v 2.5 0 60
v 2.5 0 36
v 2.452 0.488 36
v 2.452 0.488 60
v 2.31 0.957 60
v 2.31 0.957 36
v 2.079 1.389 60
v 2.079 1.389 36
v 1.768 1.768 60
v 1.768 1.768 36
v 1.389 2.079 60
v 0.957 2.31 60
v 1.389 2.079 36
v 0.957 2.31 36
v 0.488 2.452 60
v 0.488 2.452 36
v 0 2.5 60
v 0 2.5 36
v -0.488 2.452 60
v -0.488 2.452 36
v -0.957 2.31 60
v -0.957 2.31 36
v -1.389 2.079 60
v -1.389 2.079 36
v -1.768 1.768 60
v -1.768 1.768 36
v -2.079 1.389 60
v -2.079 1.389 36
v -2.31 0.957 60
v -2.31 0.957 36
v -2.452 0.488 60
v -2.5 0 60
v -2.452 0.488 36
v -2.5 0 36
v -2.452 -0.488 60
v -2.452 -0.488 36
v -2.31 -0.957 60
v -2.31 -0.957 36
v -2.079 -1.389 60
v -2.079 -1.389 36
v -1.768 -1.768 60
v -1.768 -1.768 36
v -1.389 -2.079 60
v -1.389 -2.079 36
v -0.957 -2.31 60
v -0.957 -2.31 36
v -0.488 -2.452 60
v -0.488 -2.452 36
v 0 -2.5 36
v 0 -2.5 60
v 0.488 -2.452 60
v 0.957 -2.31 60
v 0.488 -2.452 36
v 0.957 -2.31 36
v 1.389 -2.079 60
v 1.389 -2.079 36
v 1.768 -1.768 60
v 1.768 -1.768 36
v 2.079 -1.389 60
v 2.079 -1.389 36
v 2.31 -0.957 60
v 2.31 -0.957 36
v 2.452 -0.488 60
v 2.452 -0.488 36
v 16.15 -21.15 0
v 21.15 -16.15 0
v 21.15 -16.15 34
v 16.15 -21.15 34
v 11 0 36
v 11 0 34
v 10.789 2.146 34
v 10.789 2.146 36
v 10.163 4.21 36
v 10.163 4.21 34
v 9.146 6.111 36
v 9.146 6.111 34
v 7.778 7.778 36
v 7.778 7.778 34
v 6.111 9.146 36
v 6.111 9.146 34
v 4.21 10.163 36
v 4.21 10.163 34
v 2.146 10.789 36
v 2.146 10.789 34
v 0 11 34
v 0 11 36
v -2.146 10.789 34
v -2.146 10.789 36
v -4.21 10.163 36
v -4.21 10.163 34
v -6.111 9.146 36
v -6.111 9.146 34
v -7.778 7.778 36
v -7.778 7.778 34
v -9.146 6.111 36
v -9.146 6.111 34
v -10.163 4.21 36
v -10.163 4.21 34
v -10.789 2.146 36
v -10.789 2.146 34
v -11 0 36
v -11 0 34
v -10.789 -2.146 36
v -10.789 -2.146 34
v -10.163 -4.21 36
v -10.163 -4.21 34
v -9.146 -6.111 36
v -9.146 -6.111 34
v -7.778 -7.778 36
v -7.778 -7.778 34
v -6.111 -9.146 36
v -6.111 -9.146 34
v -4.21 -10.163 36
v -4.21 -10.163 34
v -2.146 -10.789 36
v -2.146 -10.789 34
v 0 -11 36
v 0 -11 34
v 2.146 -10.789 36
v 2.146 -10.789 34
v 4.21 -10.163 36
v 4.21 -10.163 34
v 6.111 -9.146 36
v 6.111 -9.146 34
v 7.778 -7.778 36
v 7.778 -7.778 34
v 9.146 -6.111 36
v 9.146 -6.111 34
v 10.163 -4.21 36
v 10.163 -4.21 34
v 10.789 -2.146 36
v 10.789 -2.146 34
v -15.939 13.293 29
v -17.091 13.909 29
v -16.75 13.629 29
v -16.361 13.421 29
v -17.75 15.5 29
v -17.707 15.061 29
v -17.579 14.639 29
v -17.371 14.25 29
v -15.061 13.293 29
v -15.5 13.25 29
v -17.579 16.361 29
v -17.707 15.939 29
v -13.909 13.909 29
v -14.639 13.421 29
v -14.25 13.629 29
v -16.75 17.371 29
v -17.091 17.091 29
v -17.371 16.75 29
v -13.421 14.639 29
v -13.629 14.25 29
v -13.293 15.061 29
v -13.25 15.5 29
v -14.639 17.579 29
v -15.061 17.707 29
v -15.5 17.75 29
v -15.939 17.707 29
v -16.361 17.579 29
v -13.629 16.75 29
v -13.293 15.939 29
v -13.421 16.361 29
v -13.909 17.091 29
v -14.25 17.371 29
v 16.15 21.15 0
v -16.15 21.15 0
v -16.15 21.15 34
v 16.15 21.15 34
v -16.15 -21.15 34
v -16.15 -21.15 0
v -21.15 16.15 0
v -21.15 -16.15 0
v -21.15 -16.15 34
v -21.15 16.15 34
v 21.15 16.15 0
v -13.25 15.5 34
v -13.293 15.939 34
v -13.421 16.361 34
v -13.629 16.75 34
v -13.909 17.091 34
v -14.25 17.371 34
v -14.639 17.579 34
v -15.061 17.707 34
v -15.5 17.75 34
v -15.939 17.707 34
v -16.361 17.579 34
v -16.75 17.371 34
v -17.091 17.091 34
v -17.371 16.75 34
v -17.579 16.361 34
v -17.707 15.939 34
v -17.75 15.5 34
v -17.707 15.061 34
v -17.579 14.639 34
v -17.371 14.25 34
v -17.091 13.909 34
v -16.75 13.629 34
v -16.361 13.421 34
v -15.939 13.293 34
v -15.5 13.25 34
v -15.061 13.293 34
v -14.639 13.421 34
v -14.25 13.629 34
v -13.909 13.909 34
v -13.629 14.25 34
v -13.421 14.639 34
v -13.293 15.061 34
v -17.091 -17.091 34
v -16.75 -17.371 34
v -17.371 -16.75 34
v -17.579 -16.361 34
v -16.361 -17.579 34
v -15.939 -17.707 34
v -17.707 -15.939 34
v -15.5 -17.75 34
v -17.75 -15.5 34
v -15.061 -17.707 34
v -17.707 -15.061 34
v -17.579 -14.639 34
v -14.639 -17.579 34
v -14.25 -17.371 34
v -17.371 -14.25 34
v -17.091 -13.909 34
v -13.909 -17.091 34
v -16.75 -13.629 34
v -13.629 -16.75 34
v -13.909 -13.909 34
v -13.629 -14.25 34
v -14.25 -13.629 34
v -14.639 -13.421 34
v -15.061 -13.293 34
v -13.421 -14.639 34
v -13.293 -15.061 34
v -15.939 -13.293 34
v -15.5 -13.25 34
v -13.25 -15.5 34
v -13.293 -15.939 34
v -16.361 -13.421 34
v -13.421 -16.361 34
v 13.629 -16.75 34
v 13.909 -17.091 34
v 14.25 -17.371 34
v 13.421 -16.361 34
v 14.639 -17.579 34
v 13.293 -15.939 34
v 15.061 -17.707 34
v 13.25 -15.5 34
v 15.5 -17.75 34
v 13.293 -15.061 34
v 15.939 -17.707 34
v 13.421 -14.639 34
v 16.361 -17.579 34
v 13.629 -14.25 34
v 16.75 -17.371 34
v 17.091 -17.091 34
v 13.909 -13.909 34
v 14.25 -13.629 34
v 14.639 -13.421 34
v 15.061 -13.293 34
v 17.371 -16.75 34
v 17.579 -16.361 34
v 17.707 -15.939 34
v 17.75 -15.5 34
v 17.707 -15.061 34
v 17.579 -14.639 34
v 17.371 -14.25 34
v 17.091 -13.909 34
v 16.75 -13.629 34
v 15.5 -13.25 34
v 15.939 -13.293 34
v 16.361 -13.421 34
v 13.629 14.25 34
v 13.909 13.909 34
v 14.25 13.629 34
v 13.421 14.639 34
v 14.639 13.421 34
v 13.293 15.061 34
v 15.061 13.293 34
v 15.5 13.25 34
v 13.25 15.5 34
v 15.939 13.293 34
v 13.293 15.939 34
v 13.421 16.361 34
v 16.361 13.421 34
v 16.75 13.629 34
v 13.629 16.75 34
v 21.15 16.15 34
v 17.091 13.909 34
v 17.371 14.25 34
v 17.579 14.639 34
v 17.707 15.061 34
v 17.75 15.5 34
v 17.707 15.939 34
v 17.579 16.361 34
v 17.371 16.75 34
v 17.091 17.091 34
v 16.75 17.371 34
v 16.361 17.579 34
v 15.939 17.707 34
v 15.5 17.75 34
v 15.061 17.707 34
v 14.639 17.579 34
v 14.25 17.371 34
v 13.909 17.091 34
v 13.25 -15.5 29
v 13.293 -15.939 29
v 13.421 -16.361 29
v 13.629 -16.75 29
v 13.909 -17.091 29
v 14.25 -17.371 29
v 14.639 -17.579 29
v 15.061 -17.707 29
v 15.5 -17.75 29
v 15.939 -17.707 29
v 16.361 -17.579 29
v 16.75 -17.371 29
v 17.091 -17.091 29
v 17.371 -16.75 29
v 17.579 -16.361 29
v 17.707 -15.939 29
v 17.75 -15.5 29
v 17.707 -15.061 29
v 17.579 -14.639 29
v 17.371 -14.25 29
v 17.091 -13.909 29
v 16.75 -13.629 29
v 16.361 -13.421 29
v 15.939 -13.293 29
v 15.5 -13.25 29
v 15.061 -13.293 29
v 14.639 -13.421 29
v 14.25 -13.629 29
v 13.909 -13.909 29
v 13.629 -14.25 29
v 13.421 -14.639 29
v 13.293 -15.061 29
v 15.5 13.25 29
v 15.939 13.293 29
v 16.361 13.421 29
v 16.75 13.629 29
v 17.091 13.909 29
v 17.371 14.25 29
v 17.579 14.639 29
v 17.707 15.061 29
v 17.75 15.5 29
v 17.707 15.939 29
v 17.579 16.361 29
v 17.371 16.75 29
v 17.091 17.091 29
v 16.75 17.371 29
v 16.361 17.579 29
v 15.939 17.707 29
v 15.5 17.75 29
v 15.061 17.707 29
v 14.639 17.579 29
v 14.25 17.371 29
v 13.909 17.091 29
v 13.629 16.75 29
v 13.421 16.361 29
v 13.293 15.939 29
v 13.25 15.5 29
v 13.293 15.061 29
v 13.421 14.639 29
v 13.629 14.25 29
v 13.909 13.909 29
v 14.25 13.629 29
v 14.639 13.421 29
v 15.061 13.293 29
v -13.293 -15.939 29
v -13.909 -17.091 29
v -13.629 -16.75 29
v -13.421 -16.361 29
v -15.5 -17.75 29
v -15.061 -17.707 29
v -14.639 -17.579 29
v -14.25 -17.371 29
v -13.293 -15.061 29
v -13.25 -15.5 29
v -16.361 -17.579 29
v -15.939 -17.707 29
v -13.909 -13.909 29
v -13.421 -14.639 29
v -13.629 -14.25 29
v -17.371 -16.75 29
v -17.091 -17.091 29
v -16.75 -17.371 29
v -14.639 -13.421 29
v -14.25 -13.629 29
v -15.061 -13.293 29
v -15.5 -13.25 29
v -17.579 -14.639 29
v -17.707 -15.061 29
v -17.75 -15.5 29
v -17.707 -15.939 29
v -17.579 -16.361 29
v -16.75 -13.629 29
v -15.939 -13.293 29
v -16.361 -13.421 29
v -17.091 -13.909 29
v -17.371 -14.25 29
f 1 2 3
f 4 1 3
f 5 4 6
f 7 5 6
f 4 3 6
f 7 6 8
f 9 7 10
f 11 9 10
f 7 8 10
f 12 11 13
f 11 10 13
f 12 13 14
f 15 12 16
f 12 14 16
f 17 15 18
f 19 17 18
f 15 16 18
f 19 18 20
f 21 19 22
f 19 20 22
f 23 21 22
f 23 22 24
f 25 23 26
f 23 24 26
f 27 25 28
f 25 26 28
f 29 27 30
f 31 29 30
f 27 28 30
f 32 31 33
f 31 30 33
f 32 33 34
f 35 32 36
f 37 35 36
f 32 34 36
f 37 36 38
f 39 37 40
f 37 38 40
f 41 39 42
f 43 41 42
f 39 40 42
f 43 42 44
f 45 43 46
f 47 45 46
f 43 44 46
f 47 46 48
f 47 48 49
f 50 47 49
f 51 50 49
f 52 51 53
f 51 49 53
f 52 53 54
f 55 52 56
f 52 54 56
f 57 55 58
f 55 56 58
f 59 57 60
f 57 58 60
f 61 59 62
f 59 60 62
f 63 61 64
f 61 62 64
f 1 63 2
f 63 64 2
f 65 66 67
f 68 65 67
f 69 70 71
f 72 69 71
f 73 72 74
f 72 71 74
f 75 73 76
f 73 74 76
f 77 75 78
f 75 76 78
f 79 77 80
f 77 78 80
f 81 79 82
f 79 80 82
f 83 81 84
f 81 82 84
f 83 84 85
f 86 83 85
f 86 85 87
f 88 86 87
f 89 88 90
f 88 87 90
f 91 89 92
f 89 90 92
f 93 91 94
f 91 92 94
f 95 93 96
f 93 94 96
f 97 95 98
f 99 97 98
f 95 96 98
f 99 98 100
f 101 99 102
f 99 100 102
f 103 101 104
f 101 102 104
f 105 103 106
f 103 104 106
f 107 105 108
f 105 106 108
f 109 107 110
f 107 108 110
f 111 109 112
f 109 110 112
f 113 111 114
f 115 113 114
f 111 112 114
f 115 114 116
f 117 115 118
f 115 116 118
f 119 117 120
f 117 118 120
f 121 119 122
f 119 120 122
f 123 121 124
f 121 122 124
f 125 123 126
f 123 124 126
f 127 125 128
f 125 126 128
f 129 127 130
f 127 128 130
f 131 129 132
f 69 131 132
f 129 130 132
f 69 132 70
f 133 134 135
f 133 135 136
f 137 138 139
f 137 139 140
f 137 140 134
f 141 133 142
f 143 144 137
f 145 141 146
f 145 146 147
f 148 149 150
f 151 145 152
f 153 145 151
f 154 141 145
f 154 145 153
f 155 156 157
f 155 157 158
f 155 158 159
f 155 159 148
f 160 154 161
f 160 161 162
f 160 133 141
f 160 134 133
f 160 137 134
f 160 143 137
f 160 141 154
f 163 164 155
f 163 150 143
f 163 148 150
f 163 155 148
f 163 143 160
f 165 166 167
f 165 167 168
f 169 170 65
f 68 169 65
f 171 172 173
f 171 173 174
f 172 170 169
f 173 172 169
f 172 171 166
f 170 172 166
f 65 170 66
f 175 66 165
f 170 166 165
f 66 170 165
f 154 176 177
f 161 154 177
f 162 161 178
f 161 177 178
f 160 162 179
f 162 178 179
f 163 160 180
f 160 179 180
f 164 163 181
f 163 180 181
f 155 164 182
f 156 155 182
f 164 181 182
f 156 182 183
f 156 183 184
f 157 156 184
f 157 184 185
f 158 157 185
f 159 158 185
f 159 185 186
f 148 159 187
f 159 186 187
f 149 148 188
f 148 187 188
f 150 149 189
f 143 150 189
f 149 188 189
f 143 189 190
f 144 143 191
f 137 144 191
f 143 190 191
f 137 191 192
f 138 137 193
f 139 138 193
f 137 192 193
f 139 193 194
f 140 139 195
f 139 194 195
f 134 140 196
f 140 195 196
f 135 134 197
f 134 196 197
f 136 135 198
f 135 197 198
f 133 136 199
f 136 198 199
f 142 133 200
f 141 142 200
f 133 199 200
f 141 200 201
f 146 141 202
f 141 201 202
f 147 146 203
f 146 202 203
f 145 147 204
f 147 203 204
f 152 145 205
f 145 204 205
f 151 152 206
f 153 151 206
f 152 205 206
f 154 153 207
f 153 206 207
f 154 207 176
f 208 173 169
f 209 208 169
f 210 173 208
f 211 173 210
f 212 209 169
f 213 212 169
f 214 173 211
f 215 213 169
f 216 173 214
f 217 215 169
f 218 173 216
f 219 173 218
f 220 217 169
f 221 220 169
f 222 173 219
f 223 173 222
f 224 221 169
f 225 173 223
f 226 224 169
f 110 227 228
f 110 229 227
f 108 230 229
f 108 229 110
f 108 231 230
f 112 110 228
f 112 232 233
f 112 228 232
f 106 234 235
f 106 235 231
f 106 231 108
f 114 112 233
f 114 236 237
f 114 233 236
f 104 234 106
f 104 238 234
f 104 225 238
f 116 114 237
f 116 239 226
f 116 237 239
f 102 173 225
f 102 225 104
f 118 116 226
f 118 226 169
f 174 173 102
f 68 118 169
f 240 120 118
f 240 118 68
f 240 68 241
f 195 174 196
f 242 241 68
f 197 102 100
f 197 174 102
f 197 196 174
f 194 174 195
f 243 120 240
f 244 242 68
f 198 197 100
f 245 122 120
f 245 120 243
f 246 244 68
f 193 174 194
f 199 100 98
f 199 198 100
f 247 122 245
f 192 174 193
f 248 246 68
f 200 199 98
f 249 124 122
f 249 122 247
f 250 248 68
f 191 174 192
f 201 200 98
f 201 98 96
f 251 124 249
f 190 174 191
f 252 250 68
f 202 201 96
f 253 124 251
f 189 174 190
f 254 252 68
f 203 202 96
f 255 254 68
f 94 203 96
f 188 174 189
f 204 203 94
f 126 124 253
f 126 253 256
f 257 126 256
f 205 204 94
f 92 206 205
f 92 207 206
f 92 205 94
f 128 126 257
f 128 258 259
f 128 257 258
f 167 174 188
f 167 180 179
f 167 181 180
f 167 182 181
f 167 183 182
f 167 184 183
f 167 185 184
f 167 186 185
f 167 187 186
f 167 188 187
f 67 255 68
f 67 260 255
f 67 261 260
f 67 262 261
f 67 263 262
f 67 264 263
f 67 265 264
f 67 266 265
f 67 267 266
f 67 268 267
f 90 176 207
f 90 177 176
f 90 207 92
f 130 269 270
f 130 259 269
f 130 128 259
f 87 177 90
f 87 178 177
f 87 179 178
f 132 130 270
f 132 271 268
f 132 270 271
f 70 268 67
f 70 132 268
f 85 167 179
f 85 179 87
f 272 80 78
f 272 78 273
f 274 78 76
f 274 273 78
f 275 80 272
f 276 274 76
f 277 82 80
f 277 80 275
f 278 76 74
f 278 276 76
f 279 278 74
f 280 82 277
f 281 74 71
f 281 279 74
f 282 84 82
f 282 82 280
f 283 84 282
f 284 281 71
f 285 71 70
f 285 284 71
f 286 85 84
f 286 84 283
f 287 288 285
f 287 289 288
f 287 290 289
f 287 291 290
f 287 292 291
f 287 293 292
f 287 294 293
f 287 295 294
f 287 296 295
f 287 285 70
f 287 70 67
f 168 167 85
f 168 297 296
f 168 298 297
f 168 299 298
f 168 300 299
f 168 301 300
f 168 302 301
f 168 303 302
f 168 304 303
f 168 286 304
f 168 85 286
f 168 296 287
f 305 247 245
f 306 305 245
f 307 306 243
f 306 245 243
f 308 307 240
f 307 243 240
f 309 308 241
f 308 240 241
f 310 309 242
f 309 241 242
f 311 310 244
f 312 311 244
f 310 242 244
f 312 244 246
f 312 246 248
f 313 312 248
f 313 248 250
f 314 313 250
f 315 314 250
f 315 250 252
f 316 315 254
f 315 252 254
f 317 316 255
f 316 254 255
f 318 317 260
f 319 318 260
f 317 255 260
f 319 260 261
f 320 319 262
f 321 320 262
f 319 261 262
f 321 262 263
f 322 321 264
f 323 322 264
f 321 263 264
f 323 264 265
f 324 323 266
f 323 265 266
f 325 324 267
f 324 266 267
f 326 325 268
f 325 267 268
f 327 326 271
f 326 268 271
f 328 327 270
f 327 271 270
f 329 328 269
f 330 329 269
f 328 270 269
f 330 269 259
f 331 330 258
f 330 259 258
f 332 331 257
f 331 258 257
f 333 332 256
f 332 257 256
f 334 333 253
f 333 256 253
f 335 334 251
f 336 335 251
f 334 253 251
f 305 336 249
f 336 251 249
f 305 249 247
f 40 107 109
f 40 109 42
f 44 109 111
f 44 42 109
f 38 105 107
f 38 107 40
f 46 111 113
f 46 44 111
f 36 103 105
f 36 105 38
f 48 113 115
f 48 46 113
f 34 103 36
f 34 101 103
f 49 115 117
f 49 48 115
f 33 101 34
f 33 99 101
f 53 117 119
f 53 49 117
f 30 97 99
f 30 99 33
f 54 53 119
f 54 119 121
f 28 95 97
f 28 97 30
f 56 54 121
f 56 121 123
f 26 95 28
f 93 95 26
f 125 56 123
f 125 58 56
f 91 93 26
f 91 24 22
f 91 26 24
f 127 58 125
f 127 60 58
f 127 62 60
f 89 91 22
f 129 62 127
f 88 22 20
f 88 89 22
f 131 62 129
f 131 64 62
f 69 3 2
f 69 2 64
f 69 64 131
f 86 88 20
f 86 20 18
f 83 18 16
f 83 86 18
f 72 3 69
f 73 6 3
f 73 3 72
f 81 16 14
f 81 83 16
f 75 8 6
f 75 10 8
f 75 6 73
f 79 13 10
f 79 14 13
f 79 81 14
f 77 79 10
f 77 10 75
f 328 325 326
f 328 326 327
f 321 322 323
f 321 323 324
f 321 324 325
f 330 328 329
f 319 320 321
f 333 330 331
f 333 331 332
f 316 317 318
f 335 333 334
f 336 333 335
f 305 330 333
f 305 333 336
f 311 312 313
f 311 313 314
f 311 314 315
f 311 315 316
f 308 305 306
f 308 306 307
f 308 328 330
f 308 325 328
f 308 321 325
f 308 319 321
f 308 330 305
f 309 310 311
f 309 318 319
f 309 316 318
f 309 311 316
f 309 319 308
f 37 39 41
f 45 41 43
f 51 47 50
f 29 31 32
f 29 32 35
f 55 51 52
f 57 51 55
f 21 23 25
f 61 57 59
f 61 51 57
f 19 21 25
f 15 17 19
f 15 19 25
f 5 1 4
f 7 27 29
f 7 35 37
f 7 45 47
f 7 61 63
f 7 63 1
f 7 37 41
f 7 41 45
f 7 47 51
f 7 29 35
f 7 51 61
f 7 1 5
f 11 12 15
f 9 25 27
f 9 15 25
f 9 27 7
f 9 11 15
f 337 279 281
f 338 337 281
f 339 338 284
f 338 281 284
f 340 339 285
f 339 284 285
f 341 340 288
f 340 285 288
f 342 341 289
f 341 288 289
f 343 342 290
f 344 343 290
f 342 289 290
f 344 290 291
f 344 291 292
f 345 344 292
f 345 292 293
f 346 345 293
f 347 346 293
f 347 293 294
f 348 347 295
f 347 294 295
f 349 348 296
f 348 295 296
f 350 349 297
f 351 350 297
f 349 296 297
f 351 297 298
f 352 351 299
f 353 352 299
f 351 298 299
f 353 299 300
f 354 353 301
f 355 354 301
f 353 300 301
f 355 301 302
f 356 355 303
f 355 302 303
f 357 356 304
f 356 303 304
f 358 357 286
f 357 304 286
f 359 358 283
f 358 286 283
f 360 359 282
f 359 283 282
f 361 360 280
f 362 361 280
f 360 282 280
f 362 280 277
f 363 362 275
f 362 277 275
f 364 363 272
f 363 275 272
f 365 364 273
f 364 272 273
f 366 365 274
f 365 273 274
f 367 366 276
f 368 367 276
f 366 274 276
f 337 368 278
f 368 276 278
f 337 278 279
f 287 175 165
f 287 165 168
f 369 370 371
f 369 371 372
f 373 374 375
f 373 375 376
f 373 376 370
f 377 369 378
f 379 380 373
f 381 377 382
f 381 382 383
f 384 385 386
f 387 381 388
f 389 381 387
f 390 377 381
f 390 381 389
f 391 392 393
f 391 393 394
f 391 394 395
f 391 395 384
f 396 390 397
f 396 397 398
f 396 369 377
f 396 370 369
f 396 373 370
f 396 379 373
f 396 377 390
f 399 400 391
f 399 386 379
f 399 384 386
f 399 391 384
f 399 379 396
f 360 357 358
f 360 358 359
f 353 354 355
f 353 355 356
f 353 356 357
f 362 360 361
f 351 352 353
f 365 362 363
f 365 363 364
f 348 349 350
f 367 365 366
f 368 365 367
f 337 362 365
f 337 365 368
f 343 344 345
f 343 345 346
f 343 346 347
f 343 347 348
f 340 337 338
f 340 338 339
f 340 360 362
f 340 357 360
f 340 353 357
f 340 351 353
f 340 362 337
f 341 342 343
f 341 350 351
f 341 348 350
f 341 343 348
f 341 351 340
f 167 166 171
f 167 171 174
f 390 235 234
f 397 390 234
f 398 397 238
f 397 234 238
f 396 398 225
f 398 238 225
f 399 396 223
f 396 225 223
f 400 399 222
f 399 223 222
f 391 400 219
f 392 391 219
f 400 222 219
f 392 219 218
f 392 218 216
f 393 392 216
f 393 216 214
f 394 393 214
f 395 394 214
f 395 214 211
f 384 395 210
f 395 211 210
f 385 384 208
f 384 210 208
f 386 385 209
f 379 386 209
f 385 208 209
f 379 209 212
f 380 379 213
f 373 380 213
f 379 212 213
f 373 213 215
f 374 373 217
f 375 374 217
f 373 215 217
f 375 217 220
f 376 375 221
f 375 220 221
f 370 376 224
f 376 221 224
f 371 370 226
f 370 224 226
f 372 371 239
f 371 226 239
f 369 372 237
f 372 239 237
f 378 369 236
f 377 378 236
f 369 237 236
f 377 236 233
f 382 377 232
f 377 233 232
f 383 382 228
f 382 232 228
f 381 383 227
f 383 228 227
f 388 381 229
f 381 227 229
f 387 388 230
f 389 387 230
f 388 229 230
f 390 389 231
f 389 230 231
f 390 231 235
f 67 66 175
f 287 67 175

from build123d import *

# Parameters (mm, degrees)
F0_W            = 42.3
F0_H            = 42.3
F1_DEPTH        = 34
F2_R            = 11
F3_DEPTH        = 2
F4_R            = 2.5
F5_DEPTH        = 24
F6_R            = 2.25
F7_DEPTH        = 5
F7_COPIES_COUNT = 4
F8_SIZE         = 5


# Not quite as in the source:
# - a pattern or mirror of a feature is missing from the dataset's text; its kind, count and spacing are read off the source's solid


with BuildPart() as f1:
    # F0 (on Top) → F1 (new body)
    with BuildSketch(Plane.XY):
        Rectangle(F0_W, F0_H)
    extrude(amount=F1_DEPTH)

    # F2 (on face) → F3 (join)
    with BuildSketch(Plane.XY.offset(34)):
        Circle(F2_R)
    extrude(amount=F3_DEPTH)

    # F4 (on face) → F5 (join)
    with BuildSketch(Plane.XY.offset(36)):
        Circle(F4_R)
    extrude(amount=F5_DEPTH)

    # F6 (on face) → F7 (cut)
    with BuildSketch(Plane.XY.offset(34)):
        with Locations((-15.5, 15.5)):
            Circle(F6_R)
    f7 = extrude(amount=-F7_DEPTH, mode=Mode.SUBTRACT)

    # F7_copies: F7 ×4 about axis
    f7_copies_axis = Axis((0, 0, 0), (0, 0, 1))
    for i in range(1, F7_COPIES_COUNT):
        add(f7.rotate(f7_copies_axis, i * 360 / F7_COPIES_COUNT), mode=Mode.SUBTRACT)

    # F8
    f8_edges = [f1.edges().sort_by_distance(p)[0] for p in [
        (-21.15, -21.15, 17),
        (-21.15, 21.15, 17),
        (21.15, 21.15, 17),
        (21.15, -21.15, 17),
    ]]
    chamfer(f8_edges, length=F8_SIZE)


solid = f1.part
